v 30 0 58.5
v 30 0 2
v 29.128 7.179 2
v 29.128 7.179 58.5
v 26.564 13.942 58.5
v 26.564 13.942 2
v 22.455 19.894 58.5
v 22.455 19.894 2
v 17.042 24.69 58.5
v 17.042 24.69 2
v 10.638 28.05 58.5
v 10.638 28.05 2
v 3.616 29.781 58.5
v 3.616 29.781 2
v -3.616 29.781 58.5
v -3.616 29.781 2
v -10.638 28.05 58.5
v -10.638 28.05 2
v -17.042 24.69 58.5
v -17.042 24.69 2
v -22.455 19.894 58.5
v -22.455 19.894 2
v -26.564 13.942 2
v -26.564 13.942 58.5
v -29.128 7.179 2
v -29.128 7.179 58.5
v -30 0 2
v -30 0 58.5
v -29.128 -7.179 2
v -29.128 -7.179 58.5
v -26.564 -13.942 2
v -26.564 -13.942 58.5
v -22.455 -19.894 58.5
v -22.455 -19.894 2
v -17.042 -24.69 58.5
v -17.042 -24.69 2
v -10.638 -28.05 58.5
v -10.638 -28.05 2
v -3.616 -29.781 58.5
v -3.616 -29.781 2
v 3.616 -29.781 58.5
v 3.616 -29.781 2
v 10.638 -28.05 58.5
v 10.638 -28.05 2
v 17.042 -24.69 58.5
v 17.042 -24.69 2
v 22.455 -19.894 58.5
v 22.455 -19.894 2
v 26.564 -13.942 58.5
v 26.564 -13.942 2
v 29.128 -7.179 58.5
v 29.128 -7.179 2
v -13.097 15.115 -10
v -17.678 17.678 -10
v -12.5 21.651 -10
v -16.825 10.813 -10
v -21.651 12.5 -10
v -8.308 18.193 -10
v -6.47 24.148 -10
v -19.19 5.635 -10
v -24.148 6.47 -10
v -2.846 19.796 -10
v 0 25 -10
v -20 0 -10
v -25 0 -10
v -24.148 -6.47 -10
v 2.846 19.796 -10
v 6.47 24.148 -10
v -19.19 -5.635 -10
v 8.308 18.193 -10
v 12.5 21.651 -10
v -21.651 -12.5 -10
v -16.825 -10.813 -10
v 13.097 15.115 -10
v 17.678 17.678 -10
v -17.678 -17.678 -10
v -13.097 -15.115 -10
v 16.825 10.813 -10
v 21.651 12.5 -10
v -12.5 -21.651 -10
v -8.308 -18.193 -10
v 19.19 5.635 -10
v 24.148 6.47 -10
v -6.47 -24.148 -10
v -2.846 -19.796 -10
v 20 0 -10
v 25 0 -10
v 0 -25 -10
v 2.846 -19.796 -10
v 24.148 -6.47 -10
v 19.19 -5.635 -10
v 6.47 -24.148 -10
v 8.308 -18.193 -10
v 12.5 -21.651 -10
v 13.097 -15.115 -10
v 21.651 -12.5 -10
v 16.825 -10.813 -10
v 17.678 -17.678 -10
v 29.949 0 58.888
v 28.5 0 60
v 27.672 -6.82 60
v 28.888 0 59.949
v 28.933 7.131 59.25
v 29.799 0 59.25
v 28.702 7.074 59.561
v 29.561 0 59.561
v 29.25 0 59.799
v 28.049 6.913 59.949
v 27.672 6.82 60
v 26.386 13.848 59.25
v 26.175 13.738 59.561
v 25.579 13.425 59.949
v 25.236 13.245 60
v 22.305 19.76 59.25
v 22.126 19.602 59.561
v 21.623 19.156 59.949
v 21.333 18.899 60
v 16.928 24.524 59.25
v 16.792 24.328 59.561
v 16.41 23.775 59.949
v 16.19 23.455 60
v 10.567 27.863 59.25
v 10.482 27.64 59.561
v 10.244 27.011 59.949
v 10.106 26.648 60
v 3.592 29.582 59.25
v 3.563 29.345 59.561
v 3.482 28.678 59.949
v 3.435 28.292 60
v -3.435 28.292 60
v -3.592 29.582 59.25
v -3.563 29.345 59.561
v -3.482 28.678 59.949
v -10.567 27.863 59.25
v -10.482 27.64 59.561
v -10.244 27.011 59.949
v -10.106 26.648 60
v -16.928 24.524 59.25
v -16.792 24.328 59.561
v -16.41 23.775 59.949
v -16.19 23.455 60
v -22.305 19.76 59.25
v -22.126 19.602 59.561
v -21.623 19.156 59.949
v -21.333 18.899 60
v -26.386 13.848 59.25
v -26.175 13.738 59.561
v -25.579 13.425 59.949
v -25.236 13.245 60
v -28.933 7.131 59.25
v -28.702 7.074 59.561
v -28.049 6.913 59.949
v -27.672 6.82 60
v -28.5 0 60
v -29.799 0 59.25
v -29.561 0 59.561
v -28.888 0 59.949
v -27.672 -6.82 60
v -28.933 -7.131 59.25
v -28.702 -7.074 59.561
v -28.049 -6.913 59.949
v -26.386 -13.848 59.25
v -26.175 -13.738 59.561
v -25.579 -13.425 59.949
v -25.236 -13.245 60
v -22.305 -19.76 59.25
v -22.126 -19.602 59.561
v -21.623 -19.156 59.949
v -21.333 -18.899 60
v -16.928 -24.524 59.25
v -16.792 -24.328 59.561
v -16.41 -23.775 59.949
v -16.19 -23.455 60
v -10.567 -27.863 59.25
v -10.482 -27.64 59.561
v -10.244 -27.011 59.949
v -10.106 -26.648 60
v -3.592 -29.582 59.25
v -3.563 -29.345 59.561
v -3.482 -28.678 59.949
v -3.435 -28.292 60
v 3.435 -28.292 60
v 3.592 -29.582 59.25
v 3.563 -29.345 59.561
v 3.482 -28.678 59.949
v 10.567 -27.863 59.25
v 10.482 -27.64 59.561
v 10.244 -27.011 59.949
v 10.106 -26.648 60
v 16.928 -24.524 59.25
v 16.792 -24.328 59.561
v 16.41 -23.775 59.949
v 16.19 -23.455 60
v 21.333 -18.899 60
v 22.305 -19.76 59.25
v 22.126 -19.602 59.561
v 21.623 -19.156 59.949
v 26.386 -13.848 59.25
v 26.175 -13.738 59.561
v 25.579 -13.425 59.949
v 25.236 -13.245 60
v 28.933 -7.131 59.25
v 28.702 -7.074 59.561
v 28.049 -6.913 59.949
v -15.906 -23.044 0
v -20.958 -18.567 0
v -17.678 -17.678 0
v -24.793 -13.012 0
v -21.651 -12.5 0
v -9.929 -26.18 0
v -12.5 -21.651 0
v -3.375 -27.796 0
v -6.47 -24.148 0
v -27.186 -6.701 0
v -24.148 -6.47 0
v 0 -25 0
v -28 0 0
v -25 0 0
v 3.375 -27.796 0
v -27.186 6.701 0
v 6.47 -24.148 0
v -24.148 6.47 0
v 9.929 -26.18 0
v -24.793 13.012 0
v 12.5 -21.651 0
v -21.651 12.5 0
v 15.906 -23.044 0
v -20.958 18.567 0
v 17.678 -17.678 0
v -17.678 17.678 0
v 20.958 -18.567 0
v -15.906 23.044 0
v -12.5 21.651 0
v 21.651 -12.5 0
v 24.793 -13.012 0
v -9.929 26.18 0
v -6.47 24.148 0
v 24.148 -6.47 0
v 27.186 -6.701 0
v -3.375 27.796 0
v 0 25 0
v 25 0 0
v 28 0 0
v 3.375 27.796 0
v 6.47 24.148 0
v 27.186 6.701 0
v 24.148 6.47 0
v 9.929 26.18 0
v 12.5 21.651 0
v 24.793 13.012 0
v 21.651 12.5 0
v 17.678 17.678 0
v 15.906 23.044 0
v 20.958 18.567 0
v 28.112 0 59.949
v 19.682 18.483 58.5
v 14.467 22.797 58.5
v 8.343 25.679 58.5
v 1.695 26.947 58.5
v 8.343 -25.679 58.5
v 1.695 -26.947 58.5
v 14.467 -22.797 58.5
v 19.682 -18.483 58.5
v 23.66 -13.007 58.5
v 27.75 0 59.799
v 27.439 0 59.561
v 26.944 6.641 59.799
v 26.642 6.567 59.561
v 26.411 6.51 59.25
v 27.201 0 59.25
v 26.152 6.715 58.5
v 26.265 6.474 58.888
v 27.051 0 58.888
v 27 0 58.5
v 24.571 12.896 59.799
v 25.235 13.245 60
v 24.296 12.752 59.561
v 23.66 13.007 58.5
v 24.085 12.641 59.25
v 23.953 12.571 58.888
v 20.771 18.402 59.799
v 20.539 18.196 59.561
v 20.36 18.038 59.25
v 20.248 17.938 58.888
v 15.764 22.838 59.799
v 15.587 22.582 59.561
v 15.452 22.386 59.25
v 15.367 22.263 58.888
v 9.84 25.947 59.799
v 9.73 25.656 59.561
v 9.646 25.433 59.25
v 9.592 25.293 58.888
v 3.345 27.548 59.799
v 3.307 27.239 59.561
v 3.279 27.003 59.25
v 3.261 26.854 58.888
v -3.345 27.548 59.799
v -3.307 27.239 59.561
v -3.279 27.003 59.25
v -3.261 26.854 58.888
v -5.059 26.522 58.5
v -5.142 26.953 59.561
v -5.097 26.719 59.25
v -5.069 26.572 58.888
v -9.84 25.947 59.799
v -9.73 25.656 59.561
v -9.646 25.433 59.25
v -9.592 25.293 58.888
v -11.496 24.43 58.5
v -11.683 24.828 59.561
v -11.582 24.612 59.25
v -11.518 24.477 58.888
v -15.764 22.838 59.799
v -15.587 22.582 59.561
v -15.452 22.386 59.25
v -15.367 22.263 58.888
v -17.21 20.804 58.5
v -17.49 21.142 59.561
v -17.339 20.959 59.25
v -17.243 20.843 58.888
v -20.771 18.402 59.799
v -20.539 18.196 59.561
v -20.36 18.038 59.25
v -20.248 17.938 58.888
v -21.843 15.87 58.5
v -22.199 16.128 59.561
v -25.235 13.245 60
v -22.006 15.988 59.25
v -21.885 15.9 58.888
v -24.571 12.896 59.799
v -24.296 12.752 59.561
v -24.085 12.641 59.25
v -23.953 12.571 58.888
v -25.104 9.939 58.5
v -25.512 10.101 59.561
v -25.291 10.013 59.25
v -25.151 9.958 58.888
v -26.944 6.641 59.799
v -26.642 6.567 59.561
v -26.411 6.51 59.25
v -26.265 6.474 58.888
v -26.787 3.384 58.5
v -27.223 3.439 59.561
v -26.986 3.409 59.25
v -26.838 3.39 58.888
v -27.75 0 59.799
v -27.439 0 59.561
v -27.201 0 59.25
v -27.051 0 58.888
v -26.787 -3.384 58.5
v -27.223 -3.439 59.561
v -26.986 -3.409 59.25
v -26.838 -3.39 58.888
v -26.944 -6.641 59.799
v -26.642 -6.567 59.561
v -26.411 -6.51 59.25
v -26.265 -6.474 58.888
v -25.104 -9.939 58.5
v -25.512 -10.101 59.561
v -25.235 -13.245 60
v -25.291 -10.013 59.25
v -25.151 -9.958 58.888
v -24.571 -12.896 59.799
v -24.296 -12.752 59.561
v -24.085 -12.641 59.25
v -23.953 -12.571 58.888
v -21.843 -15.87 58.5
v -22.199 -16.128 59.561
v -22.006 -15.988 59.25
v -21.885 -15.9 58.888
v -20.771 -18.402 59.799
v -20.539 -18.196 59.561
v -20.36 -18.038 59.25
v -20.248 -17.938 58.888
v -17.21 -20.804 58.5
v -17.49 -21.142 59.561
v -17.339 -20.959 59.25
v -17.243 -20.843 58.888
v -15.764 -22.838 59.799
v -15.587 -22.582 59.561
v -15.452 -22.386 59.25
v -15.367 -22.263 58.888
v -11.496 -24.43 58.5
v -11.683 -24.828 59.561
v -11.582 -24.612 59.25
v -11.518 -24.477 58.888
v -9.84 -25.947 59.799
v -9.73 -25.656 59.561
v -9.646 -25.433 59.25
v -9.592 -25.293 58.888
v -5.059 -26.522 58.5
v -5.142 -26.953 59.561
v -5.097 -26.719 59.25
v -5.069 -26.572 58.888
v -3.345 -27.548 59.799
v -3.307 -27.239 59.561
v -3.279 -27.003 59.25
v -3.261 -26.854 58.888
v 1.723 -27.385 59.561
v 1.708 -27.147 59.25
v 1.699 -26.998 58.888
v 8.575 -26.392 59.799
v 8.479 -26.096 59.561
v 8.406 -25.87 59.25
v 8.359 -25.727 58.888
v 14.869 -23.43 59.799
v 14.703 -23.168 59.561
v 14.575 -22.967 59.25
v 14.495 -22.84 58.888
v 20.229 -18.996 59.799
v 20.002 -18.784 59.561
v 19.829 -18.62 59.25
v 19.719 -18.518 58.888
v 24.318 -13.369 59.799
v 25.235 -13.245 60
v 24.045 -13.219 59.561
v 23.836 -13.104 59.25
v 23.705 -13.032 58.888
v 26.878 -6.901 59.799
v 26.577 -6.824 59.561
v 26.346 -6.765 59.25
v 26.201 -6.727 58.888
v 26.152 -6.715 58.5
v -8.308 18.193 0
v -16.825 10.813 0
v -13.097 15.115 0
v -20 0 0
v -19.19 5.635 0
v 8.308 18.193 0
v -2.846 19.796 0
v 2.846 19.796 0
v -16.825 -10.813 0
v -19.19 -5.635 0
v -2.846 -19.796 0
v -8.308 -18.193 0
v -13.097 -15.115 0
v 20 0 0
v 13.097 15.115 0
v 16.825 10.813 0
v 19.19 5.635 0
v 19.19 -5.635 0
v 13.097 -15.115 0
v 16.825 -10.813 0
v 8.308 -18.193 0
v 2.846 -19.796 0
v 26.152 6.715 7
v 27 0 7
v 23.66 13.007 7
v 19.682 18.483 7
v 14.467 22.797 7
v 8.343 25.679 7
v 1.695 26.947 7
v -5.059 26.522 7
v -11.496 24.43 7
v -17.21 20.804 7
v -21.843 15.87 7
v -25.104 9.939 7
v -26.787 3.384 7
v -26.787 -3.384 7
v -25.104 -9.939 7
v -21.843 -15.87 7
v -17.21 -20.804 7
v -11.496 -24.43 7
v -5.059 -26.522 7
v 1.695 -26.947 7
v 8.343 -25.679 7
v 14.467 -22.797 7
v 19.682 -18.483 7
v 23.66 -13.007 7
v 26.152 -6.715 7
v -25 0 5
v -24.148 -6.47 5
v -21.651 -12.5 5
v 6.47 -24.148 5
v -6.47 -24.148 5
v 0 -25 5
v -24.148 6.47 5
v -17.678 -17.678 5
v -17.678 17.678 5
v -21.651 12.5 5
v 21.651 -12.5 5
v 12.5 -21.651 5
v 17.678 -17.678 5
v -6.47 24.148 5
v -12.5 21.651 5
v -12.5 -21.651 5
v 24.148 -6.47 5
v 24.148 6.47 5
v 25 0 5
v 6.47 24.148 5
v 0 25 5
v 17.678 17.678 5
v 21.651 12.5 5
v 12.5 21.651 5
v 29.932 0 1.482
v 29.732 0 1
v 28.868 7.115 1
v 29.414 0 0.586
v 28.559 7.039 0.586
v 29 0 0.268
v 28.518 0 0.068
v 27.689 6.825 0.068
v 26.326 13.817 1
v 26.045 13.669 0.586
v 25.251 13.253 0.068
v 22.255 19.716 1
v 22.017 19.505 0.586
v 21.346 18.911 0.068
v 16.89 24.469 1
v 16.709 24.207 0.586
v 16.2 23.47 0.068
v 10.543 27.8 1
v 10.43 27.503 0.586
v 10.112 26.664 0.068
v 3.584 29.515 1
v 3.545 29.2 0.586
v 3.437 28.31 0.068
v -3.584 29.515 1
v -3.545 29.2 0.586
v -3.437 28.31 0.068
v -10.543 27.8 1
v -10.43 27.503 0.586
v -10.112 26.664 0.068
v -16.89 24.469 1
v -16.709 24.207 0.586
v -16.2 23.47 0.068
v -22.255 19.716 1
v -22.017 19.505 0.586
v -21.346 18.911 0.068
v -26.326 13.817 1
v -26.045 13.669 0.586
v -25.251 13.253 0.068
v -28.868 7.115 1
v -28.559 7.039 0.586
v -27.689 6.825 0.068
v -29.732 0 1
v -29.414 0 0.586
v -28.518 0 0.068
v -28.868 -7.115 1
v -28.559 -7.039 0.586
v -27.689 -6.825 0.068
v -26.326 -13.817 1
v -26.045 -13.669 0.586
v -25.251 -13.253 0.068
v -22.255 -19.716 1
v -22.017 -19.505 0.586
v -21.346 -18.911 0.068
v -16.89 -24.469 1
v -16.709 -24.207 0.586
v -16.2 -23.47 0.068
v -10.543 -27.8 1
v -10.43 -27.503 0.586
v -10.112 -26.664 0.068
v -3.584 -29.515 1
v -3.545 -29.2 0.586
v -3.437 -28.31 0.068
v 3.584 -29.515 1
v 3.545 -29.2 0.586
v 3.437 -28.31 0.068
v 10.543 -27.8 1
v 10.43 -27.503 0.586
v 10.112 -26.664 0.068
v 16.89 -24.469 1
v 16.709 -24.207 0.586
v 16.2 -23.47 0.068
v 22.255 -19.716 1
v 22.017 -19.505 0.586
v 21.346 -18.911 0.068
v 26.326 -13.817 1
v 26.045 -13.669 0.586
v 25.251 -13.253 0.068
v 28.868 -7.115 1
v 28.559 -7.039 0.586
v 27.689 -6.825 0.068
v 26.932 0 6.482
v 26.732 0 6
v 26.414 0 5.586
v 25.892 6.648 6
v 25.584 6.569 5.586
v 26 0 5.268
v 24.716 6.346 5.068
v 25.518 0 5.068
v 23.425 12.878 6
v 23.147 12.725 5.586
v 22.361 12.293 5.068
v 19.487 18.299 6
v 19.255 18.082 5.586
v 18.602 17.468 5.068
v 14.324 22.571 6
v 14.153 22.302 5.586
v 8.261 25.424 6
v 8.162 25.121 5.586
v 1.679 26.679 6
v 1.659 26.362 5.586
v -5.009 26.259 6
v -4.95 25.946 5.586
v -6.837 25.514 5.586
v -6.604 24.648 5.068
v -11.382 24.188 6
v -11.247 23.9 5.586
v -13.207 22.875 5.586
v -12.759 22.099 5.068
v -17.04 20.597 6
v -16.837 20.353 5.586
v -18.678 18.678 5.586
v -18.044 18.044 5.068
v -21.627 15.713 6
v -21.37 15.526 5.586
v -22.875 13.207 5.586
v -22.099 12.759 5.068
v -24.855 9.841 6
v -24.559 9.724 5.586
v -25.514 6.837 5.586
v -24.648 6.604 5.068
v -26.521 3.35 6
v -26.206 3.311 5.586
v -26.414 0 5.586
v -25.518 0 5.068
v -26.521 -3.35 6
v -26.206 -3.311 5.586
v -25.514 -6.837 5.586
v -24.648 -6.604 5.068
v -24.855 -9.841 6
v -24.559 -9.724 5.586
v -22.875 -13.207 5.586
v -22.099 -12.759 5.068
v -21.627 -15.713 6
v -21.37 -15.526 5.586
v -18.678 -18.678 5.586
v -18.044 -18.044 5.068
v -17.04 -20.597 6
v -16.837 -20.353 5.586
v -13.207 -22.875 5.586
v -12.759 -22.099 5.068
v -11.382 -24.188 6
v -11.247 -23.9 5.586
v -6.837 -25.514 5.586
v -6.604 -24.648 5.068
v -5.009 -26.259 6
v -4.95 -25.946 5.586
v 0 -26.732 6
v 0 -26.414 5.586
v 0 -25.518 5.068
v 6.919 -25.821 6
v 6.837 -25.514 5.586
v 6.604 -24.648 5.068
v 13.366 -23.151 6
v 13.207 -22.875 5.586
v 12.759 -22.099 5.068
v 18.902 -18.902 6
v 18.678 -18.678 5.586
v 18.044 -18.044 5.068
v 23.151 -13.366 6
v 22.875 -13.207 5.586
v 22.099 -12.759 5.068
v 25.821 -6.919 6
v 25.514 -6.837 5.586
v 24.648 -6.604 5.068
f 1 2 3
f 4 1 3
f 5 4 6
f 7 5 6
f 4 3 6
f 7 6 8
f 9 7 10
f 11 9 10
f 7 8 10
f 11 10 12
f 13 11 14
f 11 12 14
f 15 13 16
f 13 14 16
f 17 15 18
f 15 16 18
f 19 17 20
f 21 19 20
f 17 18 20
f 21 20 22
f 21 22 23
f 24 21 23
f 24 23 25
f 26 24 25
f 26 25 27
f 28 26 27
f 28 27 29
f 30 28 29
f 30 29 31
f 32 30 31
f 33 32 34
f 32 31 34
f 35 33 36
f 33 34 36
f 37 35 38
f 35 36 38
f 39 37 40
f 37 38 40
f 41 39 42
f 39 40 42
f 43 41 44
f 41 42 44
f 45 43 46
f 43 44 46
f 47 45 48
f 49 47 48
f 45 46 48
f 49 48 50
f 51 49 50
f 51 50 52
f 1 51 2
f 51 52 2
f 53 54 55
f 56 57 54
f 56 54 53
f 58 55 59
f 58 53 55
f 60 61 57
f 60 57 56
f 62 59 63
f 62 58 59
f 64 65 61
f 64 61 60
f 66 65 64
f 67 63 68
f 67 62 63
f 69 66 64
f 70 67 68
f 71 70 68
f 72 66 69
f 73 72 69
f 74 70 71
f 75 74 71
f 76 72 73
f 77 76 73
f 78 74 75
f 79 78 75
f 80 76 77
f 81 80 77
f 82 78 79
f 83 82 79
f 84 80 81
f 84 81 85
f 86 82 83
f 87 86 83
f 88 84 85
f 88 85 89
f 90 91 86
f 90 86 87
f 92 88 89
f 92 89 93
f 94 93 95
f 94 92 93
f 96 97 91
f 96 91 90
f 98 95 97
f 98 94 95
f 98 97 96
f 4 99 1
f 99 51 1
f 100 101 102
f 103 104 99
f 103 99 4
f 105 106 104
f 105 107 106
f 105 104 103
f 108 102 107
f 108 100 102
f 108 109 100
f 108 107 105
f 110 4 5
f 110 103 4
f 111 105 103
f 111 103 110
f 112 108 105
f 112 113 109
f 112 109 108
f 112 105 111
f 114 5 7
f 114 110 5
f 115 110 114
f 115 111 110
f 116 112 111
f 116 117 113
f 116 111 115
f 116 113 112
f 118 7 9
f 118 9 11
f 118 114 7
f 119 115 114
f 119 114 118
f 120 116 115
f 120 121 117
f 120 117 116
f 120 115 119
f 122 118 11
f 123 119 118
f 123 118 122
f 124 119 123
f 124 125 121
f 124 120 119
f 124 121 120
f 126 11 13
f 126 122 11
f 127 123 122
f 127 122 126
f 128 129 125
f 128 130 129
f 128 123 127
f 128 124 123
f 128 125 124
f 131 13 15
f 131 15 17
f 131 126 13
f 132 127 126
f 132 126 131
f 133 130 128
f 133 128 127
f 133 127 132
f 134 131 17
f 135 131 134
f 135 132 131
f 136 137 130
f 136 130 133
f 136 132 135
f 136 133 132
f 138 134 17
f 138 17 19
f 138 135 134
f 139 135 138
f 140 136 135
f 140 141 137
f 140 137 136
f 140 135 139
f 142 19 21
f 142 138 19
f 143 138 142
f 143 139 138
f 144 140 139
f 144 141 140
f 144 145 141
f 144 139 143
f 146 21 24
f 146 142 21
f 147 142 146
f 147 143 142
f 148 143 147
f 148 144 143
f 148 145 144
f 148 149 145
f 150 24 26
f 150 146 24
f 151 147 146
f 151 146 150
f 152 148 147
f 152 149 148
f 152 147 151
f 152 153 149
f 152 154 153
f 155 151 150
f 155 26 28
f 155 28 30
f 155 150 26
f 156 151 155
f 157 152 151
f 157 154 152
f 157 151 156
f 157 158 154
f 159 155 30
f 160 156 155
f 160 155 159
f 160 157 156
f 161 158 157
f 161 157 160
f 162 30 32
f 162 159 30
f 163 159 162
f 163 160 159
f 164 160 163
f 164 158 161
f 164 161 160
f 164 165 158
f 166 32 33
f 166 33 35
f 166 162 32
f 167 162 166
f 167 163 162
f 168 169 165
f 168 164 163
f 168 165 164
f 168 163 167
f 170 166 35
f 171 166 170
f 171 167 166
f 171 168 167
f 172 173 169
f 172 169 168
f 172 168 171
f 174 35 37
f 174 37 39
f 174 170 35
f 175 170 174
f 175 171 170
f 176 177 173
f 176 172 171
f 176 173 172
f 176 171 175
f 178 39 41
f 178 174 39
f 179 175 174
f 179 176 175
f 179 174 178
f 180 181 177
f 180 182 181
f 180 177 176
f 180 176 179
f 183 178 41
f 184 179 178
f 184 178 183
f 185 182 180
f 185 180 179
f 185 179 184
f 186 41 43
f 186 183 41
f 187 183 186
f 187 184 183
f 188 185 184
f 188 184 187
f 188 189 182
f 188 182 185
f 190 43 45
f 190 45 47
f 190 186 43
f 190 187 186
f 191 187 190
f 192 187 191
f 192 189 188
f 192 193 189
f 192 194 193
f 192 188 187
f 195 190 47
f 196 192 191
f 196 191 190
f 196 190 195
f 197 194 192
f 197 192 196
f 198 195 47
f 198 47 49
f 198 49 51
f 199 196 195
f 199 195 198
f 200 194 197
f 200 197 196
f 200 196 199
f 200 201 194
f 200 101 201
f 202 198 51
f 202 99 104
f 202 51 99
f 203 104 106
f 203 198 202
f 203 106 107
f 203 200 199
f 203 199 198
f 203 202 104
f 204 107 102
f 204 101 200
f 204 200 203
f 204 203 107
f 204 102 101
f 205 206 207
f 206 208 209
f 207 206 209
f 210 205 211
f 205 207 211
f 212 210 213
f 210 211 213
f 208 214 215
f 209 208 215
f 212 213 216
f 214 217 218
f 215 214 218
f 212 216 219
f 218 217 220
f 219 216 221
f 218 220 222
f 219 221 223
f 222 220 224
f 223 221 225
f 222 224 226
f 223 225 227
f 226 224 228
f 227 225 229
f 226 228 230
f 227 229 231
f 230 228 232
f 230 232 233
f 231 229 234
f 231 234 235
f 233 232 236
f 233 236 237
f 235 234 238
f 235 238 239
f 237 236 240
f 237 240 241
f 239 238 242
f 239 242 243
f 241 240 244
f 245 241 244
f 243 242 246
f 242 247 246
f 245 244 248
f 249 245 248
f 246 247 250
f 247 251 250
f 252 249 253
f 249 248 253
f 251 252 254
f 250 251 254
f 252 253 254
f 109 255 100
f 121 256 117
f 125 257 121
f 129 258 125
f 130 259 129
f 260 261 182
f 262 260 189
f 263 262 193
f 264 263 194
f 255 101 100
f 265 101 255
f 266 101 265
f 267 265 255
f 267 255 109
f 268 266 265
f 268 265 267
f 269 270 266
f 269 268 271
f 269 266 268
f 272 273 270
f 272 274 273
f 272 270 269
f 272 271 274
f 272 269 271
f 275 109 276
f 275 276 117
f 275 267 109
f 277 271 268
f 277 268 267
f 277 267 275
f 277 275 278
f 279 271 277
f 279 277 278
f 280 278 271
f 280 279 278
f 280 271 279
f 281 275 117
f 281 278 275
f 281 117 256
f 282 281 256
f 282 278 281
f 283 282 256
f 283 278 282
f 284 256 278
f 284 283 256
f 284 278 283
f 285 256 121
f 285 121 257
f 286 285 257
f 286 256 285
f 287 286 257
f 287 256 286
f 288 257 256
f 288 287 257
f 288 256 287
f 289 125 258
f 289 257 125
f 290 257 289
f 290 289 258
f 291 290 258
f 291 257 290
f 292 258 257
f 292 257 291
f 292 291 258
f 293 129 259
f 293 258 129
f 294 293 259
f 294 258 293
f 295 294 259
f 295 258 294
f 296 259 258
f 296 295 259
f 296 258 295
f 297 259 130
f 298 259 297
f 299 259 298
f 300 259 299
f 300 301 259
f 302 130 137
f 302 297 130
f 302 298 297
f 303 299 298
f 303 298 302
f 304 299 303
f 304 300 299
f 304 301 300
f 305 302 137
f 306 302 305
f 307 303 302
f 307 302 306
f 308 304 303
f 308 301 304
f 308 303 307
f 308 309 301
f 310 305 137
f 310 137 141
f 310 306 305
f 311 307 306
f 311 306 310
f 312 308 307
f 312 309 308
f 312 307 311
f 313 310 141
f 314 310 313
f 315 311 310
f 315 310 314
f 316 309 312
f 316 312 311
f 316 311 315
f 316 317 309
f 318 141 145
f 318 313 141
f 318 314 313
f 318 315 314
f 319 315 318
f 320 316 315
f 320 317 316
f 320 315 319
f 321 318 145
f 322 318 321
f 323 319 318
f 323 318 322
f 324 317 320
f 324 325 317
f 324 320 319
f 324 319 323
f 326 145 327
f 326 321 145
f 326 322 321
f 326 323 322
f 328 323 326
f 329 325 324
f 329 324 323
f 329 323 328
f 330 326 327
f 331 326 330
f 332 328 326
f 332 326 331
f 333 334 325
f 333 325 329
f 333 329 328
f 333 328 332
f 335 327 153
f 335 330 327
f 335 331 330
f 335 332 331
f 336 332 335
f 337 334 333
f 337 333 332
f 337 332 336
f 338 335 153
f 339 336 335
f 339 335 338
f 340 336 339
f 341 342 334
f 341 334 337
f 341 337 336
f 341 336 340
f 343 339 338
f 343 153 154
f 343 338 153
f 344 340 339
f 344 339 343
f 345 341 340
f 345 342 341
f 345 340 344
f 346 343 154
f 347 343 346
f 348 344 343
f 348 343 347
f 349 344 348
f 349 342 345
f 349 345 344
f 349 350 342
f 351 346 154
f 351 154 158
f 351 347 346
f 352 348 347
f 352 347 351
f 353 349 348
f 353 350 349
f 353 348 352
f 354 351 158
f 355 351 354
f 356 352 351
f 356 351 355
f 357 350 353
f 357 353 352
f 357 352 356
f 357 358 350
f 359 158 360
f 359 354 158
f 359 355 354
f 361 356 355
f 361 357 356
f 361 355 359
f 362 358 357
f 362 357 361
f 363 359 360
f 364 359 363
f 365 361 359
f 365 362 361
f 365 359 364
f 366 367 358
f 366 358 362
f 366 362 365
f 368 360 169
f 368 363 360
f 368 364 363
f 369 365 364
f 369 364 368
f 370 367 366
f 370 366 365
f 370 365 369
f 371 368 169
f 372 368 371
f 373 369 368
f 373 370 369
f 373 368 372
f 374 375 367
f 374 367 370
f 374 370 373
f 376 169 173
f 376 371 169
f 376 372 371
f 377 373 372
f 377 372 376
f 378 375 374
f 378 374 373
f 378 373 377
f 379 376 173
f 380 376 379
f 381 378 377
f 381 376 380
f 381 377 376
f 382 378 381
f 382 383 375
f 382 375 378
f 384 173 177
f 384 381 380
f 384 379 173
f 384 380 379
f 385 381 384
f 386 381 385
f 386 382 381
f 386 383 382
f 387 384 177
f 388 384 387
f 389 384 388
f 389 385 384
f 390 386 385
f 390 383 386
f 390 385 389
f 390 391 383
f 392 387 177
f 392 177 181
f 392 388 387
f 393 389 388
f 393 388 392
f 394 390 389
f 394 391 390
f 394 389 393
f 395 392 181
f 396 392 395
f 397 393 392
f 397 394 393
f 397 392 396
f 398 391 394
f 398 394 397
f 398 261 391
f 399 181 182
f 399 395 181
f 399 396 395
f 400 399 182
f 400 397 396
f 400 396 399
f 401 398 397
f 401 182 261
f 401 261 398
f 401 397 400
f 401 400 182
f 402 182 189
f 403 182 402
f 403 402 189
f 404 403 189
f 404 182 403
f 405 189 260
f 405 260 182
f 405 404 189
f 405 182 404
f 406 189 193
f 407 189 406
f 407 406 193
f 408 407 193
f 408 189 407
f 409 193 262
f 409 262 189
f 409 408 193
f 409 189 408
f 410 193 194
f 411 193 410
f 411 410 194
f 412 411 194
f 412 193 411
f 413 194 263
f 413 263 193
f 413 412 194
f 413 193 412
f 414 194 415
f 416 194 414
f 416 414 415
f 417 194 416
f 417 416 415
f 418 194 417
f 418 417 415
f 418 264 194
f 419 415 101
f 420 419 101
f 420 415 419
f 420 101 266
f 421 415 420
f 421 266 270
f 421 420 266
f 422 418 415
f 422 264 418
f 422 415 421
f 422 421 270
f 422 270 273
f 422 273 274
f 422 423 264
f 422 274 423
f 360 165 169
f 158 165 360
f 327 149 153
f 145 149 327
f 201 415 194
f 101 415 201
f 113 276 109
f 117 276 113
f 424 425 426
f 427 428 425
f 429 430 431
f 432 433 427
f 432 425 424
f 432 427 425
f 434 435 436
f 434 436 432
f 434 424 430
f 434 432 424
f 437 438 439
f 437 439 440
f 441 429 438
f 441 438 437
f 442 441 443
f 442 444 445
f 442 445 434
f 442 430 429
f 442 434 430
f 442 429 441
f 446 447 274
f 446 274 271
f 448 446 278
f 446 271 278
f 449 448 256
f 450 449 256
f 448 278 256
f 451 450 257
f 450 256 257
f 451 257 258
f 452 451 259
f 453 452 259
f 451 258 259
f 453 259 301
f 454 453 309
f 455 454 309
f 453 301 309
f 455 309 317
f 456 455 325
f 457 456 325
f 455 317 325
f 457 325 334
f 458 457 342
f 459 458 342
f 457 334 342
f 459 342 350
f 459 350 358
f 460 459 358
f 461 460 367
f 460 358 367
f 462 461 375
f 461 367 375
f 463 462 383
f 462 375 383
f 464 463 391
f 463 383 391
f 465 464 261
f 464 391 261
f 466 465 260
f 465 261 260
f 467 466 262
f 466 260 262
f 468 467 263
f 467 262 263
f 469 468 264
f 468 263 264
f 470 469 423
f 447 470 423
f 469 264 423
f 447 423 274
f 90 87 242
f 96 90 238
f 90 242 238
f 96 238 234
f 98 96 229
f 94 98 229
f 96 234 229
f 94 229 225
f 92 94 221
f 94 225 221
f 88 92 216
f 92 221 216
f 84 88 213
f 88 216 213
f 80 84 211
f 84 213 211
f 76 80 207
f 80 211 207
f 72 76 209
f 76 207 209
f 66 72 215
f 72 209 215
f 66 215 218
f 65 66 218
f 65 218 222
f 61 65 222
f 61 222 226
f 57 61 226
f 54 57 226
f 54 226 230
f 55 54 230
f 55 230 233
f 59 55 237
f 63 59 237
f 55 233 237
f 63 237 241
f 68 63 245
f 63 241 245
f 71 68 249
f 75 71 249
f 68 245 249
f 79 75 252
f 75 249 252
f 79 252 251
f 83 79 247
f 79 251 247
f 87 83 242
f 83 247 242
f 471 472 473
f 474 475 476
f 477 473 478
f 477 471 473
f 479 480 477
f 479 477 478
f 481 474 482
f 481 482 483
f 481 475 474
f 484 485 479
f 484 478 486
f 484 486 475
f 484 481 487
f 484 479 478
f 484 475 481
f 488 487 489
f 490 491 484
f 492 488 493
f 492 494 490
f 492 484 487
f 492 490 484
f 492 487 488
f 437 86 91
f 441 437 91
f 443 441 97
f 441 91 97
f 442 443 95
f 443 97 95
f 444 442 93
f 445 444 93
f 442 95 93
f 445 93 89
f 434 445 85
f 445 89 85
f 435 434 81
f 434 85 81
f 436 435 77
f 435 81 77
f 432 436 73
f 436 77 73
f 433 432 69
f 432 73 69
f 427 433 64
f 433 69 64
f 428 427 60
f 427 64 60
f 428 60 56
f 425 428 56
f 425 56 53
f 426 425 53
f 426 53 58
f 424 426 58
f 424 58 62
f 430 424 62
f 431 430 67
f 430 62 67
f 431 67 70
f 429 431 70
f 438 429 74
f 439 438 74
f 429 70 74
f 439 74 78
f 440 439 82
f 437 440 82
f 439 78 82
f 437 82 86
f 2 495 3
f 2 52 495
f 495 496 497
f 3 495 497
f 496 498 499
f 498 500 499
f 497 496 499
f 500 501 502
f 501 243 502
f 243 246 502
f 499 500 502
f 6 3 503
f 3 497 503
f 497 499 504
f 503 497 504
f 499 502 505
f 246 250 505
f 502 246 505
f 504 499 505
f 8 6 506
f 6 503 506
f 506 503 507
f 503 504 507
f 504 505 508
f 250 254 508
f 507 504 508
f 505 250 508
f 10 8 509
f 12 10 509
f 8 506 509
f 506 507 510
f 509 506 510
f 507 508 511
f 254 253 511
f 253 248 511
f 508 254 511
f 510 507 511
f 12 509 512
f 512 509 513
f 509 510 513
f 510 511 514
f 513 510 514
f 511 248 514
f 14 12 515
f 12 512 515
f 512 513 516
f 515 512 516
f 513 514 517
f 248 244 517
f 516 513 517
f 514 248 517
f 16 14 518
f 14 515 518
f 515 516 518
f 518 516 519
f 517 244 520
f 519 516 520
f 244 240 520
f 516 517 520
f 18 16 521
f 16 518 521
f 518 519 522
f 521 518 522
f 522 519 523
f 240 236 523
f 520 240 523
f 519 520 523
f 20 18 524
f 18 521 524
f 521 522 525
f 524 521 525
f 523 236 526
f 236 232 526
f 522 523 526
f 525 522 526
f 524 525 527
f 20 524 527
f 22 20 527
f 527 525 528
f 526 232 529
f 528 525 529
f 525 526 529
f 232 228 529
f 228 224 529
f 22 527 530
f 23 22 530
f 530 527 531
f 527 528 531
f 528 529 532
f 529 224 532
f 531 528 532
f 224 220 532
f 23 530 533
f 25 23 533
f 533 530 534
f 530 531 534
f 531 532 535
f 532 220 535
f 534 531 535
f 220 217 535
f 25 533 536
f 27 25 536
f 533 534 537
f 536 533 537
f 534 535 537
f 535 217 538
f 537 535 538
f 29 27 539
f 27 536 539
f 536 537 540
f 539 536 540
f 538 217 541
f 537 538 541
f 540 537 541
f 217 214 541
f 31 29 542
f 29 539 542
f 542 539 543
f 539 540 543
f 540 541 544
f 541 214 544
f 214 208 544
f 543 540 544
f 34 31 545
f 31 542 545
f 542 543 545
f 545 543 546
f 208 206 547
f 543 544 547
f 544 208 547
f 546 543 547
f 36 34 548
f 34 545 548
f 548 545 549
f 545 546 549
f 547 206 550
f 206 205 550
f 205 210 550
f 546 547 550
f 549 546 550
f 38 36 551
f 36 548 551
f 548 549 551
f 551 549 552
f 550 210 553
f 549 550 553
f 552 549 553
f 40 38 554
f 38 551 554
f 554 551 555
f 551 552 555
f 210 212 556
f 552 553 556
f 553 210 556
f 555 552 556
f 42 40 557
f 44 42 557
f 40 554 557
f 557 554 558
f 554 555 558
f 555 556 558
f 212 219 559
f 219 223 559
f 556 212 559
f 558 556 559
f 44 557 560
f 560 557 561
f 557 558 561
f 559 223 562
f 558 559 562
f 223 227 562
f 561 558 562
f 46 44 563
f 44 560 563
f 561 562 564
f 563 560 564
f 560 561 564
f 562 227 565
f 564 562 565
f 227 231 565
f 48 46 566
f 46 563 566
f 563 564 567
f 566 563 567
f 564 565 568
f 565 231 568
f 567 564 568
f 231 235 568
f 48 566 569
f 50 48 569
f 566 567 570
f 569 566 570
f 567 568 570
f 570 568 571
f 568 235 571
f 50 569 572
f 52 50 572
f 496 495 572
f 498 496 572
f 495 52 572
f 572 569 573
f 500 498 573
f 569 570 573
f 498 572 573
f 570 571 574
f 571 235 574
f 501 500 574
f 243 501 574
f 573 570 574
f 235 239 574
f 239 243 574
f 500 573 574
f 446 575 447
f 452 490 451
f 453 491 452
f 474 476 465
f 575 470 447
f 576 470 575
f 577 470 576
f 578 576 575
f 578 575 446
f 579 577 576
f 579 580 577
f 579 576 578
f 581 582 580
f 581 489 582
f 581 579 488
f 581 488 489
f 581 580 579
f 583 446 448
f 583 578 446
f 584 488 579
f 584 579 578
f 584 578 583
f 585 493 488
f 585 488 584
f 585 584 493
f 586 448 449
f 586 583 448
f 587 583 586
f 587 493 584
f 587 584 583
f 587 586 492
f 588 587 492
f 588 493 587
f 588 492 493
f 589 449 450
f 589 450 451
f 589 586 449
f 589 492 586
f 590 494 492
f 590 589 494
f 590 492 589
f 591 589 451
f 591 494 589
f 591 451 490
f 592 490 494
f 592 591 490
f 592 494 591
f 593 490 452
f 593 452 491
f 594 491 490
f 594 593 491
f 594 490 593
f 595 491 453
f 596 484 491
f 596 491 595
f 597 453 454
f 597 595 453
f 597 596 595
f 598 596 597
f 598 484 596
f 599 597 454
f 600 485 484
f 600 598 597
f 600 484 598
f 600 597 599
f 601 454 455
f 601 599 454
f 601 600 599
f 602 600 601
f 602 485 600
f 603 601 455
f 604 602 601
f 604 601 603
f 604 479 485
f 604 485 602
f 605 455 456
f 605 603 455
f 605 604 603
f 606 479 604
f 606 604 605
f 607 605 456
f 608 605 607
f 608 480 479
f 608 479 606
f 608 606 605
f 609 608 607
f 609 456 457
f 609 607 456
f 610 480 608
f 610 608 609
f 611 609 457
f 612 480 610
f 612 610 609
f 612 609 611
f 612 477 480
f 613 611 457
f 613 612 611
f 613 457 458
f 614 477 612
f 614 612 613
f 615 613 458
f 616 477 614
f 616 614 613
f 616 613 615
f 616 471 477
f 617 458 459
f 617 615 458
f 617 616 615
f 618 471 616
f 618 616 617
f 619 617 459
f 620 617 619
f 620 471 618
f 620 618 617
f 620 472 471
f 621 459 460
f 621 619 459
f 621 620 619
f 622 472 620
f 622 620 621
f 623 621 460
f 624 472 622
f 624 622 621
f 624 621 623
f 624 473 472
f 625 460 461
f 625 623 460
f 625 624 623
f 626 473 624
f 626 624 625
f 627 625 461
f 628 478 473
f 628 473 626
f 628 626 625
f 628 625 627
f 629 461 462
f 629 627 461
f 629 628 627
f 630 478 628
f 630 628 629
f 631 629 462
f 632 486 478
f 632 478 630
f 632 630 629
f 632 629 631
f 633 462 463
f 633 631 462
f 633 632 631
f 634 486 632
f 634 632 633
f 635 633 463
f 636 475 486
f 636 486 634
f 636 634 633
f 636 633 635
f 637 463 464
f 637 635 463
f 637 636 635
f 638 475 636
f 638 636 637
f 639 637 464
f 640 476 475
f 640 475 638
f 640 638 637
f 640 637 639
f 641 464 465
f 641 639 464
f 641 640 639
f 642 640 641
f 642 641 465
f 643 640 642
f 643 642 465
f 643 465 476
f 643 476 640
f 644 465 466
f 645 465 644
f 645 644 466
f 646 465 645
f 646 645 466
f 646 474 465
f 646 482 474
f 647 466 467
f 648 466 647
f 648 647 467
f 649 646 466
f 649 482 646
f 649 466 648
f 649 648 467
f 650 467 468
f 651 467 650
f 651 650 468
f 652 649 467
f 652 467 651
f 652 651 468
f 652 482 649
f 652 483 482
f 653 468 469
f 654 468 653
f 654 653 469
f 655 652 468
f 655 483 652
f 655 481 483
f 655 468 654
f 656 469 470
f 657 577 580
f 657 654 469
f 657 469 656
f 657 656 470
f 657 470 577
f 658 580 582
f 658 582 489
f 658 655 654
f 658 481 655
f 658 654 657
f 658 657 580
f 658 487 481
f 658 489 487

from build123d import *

# Parameters (mm, degrees)
F0_R       = 30
F1_DEPTH   = 60
F2_R       = 27
F1_FACE1_R = 30
F3_DEPTH   = 55
F4_R       = 25
F5_DEPTH   = 10
F6_R       = 20
F7_DEPTH   = 10
F8_R       = 1.49999
F9_R       = 2
F10_R      = 2


# Not quite as in the source:
# - a fillet or chamfer is up to 0.001 mm smaller than in the source, because OpenCascade refuses the exact size


with BuildPart() as f1:
    # F0 (on Top) → F1 (new body)
    with BuildSketch(Plane.XY):
        Circle(F0_R)
    extrude(amount=F1_DEPTH)

    # F2 (on face) + F1_face1 (on face) → F3 (cut)
    with BuildSketch(Plane.XY.offset(60)):
        Circle(F2_R)
    with BuildSketch(Plane(origin=(0, 0, 0), x_dir=(1, 0, 0), z_dir=(0, 0, -1))):
        Circle(F1_FACE1_R)
    extrude(amount=-F3_DEPTH, dir=(0, 0, 1), mode=Mode.SUBTRACT)

    # F4 (on face) → F5 (join)
    with BuildSketch(Plane(origin=(0, 0, 0), x_dir=(1, 0, 0), z_dir=(0, 0, -1))):
        Circle(F4_R)
    extrude(amount=F5_DEPTH)

    # F6 (on face) → F7 (cut)
    with BuildSketch(Plane(origin=(0, 0, -10), x_dir=(1, 0, 0), z_dir=(0, 0, -1))):
        Circle(F6_R)
    extrude(amount=-F7_DEPTH, mode=Mode.SUBTRACT)

    # F8 (radius 1.5 in the source; OpenCascade refuses exactly that, so slightly less here)
    f8_edges = [f1.edges().sort_by_distance(p)[0] for p in [
        (-30, 0, 60),
        (-27, 0, 60),
    ]]
    fillet(f8_edges, radius=F8_R)

    # F9
    f9_edges = [f1.edges().sort_by_distance(p)[0] for p in [
        (-30, 0, 0),
    ]]
    fillet(f9_edges, radius=F9_R)

    # F10
    f10_edges = [f1.edges().sort_by_distance(p)[0] for p in [
        (-27, 0, 5),
    ]]
    fillet(f10_edges, radius=F10_R)


solid = f1.part
